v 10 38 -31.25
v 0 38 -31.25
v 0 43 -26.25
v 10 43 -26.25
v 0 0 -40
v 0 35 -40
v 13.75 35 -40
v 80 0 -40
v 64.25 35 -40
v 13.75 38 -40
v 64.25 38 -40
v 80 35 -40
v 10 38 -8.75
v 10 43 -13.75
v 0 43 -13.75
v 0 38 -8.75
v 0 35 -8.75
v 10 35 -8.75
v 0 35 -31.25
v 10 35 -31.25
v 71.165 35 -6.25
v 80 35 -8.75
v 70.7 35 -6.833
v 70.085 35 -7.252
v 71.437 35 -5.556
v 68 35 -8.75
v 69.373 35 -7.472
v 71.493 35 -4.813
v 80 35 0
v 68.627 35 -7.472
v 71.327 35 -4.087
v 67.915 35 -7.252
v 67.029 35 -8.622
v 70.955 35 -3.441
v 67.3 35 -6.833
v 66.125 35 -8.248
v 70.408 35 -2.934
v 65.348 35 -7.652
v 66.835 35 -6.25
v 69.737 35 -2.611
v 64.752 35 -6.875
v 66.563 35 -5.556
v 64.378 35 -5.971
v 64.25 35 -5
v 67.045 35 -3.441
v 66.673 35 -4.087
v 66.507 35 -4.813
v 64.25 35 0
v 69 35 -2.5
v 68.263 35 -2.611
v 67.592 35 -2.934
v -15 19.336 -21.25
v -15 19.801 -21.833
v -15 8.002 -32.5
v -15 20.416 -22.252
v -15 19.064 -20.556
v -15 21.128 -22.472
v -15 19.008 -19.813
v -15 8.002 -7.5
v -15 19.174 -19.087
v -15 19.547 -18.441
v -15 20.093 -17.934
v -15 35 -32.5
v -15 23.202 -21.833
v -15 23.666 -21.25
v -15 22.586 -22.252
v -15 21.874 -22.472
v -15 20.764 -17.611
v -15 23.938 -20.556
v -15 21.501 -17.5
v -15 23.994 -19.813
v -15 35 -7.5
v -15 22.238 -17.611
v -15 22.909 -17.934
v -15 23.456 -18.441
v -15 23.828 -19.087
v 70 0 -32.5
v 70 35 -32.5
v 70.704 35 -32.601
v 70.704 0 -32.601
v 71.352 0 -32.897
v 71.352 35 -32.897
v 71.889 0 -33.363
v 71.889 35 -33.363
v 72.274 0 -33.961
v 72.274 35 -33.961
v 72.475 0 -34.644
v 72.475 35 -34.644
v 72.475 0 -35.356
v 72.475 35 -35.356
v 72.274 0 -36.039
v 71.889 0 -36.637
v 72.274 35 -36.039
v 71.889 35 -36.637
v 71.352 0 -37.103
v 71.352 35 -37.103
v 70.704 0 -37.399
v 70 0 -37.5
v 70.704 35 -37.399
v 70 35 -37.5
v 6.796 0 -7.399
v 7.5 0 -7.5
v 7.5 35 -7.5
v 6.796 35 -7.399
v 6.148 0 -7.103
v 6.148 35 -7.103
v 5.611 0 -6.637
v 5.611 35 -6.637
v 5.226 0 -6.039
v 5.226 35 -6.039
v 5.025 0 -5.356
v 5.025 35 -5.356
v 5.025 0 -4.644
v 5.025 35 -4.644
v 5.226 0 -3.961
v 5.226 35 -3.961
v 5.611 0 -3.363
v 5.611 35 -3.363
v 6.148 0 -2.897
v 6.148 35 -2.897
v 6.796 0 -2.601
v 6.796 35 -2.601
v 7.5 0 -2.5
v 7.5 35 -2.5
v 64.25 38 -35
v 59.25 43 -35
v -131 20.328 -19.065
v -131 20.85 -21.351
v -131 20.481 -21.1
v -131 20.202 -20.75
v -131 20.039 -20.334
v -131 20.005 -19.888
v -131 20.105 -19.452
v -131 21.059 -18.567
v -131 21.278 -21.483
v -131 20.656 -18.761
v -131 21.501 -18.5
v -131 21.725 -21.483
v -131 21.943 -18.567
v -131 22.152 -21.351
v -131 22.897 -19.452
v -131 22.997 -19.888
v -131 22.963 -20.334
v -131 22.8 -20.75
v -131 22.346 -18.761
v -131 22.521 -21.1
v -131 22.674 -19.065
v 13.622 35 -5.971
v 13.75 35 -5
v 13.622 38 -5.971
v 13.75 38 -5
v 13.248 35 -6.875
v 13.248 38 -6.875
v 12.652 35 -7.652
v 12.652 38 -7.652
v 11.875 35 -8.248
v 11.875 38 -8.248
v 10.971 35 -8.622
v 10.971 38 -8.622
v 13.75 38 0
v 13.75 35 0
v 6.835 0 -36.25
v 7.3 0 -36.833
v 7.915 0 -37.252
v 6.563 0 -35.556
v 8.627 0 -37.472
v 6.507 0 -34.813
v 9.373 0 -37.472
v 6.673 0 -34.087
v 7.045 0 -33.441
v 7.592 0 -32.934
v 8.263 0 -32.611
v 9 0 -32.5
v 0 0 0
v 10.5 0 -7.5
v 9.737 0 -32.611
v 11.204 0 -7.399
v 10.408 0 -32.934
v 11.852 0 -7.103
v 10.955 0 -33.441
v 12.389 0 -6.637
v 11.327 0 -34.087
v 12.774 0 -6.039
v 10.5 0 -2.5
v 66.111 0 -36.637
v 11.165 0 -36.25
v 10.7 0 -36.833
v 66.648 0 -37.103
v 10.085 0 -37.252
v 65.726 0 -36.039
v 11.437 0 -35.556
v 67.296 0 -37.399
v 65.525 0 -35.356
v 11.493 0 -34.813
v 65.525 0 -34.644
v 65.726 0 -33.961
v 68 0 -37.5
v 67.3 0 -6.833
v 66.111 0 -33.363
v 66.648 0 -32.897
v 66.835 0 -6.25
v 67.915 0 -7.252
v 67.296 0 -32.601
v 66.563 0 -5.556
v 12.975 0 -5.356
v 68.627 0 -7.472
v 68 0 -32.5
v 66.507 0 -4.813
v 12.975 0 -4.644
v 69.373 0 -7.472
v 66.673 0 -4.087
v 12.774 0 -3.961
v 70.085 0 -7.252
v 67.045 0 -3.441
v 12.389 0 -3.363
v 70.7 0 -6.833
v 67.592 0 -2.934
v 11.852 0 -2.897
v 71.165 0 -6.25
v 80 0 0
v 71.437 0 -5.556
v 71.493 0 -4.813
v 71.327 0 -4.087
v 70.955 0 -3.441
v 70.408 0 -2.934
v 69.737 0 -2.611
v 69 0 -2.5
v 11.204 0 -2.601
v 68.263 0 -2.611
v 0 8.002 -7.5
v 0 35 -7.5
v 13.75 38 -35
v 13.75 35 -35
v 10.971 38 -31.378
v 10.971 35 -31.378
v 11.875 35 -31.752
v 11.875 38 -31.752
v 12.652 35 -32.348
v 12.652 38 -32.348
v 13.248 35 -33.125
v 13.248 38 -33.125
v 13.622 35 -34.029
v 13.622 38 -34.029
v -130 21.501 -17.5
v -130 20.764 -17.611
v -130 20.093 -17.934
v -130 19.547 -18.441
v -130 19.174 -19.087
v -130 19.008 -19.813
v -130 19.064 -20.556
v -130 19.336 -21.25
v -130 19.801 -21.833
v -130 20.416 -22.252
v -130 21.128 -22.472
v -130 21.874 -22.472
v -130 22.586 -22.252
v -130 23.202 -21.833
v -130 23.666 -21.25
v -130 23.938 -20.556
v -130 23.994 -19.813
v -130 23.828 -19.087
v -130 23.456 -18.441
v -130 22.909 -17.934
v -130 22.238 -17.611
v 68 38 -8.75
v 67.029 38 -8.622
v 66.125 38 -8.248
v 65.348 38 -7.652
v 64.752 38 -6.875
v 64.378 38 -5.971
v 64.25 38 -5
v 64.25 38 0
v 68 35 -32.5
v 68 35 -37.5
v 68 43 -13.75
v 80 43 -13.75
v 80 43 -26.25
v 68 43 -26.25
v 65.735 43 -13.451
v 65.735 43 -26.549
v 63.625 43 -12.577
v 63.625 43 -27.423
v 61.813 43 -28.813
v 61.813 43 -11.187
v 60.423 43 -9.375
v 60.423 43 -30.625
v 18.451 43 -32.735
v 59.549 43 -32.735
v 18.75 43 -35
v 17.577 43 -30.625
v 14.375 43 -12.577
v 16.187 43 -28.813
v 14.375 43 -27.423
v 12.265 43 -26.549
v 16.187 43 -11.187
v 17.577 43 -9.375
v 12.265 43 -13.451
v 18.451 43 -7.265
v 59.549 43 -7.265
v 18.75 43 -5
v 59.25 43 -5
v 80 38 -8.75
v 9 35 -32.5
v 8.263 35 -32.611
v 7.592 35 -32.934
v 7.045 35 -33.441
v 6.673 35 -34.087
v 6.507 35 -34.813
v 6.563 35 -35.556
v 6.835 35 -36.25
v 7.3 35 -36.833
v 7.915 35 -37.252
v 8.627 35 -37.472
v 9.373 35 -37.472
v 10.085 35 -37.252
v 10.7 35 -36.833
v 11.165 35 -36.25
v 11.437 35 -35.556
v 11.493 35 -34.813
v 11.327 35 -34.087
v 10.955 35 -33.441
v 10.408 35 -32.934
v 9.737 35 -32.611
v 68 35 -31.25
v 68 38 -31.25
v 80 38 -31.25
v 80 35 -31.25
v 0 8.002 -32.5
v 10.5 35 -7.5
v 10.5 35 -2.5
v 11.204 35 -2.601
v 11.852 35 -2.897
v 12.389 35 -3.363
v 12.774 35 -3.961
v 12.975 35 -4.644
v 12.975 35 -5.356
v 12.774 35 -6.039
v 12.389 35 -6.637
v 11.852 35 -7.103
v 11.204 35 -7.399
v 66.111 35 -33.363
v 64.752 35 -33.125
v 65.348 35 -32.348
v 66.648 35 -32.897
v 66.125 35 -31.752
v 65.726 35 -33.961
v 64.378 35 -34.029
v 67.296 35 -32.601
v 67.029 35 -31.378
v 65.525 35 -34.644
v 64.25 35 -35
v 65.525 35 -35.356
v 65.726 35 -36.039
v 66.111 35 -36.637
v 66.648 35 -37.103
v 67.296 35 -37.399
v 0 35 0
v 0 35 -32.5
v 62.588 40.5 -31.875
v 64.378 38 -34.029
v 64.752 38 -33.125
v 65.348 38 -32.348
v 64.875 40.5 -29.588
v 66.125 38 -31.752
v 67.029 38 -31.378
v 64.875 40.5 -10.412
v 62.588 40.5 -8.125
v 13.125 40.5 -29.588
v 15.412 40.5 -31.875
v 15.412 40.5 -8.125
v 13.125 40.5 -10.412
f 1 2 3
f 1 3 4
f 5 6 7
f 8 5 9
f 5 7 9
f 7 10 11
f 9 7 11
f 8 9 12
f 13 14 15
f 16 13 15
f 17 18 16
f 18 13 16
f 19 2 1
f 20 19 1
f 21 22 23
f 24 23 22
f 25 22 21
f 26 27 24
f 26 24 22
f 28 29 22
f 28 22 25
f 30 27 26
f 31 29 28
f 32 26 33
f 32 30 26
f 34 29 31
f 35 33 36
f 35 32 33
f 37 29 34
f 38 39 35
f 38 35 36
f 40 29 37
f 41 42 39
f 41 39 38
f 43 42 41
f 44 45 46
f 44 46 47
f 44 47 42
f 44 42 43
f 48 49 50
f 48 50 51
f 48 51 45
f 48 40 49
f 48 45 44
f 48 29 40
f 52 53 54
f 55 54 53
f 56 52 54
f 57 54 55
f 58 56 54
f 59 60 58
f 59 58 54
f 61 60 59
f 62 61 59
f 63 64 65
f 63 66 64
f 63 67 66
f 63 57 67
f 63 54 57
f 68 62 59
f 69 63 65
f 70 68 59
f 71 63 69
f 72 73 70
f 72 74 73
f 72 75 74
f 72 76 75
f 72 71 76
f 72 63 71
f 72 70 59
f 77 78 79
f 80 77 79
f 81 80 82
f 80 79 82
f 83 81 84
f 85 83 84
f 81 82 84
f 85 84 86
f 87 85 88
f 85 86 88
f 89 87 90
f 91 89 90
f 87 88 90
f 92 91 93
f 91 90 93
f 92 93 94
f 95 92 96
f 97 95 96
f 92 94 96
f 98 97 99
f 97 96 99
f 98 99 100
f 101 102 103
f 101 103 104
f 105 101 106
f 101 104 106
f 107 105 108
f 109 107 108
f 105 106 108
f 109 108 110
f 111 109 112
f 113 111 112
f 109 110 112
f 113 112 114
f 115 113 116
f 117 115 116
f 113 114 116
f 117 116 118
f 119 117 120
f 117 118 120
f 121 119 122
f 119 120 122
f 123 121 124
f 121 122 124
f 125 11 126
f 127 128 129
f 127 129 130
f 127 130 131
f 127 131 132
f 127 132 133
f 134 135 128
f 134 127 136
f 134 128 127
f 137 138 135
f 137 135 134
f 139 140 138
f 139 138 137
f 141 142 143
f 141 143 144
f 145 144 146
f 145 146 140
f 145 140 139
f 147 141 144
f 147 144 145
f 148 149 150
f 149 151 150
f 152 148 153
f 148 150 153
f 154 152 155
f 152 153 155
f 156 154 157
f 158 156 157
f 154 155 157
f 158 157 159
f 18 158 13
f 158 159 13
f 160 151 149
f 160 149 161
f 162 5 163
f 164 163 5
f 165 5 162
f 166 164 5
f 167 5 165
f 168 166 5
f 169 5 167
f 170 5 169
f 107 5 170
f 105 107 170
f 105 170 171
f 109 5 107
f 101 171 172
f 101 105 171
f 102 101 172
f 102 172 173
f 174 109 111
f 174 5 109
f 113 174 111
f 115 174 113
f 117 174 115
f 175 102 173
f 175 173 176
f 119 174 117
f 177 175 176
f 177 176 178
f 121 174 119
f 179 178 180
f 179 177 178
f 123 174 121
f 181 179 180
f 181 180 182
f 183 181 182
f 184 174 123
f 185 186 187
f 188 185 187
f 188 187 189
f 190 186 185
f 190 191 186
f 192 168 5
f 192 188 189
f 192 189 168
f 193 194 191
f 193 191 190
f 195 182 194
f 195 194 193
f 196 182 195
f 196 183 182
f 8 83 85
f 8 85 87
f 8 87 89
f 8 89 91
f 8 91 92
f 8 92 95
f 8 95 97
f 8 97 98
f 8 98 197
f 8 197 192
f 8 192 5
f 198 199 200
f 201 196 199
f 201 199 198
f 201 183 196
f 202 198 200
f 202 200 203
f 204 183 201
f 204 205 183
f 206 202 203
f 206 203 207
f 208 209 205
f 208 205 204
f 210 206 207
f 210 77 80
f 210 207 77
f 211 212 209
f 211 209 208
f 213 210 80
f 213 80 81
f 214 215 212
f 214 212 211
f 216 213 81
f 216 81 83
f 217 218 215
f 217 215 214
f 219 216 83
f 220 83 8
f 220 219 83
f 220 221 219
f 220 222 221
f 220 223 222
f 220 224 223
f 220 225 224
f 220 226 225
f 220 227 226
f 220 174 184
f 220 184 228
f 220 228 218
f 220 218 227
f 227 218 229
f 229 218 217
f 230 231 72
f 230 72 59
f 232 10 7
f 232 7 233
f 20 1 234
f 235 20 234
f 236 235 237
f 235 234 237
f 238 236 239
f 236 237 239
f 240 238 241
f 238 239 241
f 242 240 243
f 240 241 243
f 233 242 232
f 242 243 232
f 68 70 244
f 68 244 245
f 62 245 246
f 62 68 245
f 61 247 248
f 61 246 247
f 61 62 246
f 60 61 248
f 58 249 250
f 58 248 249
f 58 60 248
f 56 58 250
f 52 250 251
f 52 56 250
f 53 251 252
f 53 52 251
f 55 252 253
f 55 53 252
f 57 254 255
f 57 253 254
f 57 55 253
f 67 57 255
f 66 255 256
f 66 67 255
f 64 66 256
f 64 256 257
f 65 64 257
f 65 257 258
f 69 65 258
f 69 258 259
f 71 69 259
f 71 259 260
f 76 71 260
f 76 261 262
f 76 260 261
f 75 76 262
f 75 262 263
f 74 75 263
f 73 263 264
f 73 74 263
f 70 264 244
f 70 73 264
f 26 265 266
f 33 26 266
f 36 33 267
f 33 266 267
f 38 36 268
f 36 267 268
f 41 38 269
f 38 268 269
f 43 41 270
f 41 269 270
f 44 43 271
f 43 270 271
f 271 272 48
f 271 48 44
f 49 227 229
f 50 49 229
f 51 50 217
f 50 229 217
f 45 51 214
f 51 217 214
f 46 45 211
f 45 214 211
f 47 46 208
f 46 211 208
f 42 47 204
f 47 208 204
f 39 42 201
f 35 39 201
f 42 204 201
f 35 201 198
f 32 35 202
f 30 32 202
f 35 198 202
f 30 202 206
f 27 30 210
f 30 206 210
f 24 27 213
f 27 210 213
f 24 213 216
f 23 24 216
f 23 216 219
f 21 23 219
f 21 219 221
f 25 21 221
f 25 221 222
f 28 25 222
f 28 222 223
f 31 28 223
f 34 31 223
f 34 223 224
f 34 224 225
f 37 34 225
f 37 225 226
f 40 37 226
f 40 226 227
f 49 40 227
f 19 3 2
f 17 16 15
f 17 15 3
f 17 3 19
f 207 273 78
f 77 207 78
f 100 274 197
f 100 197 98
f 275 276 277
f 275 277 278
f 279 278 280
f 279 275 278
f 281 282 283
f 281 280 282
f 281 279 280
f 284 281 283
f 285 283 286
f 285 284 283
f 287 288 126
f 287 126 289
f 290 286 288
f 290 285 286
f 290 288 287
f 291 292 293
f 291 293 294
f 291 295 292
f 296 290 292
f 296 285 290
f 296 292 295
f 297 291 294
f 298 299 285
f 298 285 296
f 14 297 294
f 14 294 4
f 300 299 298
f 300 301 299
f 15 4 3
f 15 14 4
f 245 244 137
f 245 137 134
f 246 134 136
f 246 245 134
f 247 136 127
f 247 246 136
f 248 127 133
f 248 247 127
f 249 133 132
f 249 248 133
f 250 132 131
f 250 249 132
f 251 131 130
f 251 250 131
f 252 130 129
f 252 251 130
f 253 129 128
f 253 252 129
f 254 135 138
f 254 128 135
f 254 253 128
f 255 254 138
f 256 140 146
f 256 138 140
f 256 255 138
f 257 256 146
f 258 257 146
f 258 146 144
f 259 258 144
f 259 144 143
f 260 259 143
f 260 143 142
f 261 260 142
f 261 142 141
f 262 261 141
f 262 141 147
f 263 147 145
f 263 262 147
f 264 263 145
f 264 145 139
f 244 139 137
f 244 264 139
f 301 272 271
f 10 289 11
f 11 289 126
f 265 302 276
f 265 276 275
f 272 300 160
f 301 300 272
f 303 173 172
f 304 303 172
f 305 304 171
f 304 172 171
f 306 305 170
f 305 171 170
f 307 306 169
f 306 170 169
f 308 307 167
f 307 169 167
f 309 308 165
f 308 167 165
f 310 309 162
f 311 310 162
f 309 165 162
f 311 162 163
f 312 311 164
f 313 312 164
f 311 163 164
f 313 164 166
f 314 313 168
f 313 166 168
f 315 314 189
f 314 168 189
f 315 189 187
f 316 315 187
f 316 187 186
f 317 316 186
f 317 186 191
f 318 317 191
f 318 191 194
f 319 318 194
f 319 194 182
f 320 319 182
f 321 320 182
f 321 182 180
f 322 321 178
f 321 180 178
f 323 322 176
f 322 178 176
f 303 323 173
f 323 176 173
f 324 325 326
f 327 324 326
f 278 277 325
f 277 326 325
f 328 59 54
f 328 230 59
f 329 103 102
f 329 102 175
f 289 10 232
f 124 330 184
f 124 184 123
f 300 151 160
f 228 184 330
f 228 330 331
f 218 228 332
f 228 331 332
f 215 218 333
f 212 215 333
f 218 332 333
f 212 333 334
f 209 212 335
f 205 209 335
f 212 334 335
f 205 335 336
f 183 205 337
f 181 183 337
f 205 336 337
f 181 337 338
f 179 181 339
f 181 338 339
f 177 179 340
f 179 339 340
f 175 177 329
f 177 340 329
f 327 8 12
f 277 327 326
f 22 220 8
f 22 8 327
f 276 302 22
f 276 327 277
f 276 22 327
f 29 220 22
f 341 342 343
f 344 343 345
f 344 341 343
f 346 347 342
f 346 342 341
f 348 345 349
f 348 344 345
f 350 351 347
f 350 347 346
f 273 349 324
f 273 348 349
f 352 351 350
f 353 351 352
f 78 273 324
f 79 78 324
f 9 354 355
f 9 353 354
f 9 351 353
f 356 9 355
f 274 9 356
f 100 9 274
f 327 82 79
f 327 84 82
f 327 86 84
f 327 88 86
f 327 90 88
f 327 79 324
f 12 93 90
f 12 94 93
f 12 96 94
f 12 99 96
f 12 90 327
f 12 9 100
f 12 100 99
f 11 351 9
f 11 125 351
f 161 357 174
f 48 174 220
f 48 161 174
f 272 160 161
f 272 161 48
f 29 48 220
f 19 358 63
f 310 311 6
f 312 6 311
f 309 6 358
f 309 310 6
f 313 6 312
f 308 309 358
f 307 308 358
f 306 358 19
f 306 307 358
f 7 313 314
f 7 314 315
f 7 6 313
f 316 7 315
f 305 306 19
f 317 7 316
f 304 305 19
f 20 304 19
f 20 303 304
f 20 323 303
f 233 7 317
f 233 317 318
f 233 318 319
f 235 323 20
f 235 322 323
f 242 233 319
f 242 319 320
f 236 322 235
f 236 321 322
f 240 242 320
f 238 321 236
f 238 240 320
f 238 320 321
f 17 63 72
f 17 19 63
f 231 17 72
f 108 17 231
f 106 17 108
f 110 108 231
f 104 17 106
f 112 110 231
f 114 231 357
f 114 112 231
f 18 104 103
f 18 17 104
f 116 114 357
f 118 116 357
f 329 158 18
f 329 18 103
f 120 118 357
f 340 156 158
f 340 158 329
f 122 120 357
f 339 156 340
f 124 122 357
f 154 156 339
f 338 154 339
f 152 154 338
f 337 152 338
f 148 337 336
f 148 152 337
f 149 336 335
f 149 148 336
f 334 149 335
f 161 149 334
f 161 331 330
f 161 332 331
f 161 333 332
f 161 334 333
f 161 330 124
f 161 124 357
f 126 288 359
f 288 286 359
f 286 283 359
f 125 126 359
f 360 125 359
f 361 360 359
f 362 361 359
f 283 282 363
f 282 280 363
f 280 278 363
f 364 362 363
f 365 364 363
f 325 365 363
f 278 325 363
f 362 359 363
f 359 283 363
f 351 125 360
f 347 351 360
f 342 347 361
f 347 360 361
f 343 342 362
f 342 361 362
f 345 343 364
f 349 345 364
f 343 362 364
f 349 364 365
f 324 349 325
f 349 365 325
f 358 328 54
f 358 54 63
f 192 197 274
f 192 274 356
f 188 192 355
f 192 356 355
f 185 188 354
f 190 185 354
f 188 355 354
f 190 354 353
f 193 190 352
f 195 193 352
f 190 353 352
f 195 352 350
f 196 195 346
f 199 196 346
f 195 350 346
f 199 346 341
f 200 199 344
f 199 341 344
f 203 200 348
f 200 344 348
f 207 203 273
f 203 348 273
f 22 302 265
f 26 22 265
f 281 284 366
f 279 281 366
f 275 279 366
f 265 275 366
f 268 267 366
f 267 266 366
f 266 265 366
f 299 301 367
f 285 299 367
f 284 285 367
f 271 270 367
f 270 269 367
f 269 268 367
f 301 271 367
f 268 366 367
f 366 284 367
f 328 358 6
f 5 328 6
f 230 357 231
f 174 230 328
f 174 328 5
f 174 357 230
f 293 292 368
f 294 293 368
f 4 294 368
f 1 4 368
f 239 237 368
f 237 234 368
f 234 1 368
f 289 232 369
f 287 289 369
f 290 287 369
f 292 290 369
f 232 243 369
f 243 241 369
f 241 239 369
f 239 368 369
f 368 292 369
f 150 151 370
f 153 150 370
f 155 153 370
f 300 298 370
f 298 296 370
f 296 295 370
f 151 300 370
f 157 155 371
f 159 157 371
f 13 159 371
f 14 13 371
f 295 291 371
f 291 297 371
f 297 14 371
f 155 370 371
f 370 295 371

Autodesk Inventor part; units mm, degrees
ref_plane "YZ Plane" through (0, 0, 0) normal (1, 0, 0) x (0, 1, 0)
ref_plane "XZ Plane" through (0, 0, 0) normal (0, 1, 0) x (-1, 0, 0)
sketch "Sketch1" plane through (0, 0, 0) normal (0, 0, 1) x (1, 0, 0)
  line L0 (0, 0) -> (80, 0)
  line L1 (80, 0) -> (80, 43)
  line L2 (80, 43) -> (0, 43)
  line L3 (0, 43) -> (0, 0)
  dimension "d0" = 80
  dimension "d1" = 43
extrude "Extrusion1" add sketch "Sketch1" against normal blind 40
sketch "Sketch2" plane through (0, 43, 0) normal (0, 1, 0) x (1, 0, 0)
  line L0 (80, 0) -> (80, 40) projected
  circle A0 centre (69, 5) radius 2.5
  arc A1 (7.5, 7.5) -> (7.5, 2.5) centre (7.5, 5) ccw
  arc A2 (10.5, 2.5) -> (10.5, 7.5) centre (10.5, 5) ccw
  line L1 (7.5, 7.5) -> (10.5, 7.5)
  line L2 (10.5, 2.5) -> (7.5, 2.5)
  arc A3 (68, 37.5) -> (68, 32.5) centre (68, 35) ccw
  arc A4 (69.5, 32.5505) -> (70, 37.5) centre (70, 35) ccw
  line L3 (68, 37.5) -> (70, 37.5)
  line L4 (68, 32.5) -> (70, 32.5)
  point P0 (0, 0)
  point P1 (69, 35)
  point P2 (9, 5)
  point P3 (9, 35)
  dimension "d4" = 11
  dimension "d5" = 30
  dimension "d6" = 5
  dimension "d7" = 60
  dimension "d16" = 5
  dimension "d17" = 5
  dimension "d18" = 5
  dimension "d19" = 1.5
  dimension "d20" = 1.5
  dimension "d24" = 5
  dimension "d25" = 5
hole "Hole1" at (69, 43, -5) at (9, 43, -35) direction (0, -1, 0) diameter 5 end through all
extrude "Extrusion2" cut sketch "Sketch2" against normal through all contours L1 A2 L2 A1 | L3 A4 L4 A3
sketch "Sketch3" plane through (0, 43, 0) normal (0, 1, 0) x (1, 0, 0)
  arc A0 (64.25, 35) -> (68, 31.25) centre (68, 35) ccw
  line L0 (64.25, 35) -> (64.25, 40)
  line L1 (68, 31.25) -> (80, 31.25)
  line L2 (64.25, 40) -> (80, 40)
  line L3 (80, 40) -> (80, 31.25)
  line L4 (80, 0) -> (80, 40) projected
  arc A1 (13.75, 5) -> (10, 8.75) centre (10, 5) ccw
  line L5 (10, 8.75) -> (0, 8.75)
  line L6 (13.75, 5) -> (13.75, 0)
  line L7 (0, 0) -> (80, 0) projected
  line L8 (0, 0) -> (0, 40) projected
  line L9 (0, 8.75) -> (0, 0)
  line L10 (0, 0) -> (13.75, 0)
  point P0 (9, 5)
  point P1 (69, 5)
  point P2 (69, 35)
  dimension "d29" = 7.5
  dimension "d34" = 7.5
  dimension "d35" = 1
extrude "Extrusion3" cut sketch "Sketch3" against normal blind 8
ref_plane "Work Plane1" through (0, 0, -20) normal (0, 0, 1) x (1, 0, 0)
mirror "Mirror2" about plane through (0, 0, -20) normal (0, 0, 1) of "Extrusion3"
chamfer "Chamfer1" distance 5 angle 45 14 edges at (39, 43, 0) (39, 43, -40) (5, 43, -8.75) (12.6517, 43, -7.6517) (13.75, 43, -2.5) (12.6517, 43, -32.3483) (5, 43, -31.25) (13.75, 43, -37.5) (74, 43, -31.25) (65.3483, 43, -32.3483) (64.25, 43, -37.5) (74, 43, -8.75) (65.3483, 43, -7.6517) (64.25, 43, -2.5)
sketch "Sketch4" plane through (0, 0, -40) normal (-1, 0, 0) x (0, 0, 1)
  line L0 (7.5, 35) -> (2.5, 35) projected
  line L1 (7.5, 35) -> (32.5, 35)
  line L2 (32.5, 35) -> (32.5, 8.0021)
  line L3 (32.5, 8.0021) -> (7.5, 8.0021)
  line L4 (7.5, 8.0021) -> (7.5, 35)
  line L5 (7.5, 35) -> (2.5, 35) projected
  point P0 (40, 0)
extrude "Extrusion4" add sketch "Sketch4" along normal blind 15
sketch "Sketch5" plane through (-15, 0, -40) normal (-1, 0, 0) x (0, 0, 1)
  line L0 (32.5, 35) -> (7.5, 35) projected
  line L1 (32.5, 8.0021) -> (32.5, 35) projected
  circle A0 centre (20, 21.5011) radius 2.5
  point P0 (40, 0)
  point P1 (20, 35)
  point P2 (32.5, 21.5011)
  dimension "d41" = 5
extrude "Extrusion5" add sketch "Sketch5" along normal blind 116
chamfer "Chamfer2" distance 1 angle 45 1 edges at (-131, 21.5011, -22.5)
thread "Thread1" size "M5x0.8" class "6g" standard "ANSI Metric M Profile" full length
properties part number "802K-MSRS11E" material "ABS Plastic"
